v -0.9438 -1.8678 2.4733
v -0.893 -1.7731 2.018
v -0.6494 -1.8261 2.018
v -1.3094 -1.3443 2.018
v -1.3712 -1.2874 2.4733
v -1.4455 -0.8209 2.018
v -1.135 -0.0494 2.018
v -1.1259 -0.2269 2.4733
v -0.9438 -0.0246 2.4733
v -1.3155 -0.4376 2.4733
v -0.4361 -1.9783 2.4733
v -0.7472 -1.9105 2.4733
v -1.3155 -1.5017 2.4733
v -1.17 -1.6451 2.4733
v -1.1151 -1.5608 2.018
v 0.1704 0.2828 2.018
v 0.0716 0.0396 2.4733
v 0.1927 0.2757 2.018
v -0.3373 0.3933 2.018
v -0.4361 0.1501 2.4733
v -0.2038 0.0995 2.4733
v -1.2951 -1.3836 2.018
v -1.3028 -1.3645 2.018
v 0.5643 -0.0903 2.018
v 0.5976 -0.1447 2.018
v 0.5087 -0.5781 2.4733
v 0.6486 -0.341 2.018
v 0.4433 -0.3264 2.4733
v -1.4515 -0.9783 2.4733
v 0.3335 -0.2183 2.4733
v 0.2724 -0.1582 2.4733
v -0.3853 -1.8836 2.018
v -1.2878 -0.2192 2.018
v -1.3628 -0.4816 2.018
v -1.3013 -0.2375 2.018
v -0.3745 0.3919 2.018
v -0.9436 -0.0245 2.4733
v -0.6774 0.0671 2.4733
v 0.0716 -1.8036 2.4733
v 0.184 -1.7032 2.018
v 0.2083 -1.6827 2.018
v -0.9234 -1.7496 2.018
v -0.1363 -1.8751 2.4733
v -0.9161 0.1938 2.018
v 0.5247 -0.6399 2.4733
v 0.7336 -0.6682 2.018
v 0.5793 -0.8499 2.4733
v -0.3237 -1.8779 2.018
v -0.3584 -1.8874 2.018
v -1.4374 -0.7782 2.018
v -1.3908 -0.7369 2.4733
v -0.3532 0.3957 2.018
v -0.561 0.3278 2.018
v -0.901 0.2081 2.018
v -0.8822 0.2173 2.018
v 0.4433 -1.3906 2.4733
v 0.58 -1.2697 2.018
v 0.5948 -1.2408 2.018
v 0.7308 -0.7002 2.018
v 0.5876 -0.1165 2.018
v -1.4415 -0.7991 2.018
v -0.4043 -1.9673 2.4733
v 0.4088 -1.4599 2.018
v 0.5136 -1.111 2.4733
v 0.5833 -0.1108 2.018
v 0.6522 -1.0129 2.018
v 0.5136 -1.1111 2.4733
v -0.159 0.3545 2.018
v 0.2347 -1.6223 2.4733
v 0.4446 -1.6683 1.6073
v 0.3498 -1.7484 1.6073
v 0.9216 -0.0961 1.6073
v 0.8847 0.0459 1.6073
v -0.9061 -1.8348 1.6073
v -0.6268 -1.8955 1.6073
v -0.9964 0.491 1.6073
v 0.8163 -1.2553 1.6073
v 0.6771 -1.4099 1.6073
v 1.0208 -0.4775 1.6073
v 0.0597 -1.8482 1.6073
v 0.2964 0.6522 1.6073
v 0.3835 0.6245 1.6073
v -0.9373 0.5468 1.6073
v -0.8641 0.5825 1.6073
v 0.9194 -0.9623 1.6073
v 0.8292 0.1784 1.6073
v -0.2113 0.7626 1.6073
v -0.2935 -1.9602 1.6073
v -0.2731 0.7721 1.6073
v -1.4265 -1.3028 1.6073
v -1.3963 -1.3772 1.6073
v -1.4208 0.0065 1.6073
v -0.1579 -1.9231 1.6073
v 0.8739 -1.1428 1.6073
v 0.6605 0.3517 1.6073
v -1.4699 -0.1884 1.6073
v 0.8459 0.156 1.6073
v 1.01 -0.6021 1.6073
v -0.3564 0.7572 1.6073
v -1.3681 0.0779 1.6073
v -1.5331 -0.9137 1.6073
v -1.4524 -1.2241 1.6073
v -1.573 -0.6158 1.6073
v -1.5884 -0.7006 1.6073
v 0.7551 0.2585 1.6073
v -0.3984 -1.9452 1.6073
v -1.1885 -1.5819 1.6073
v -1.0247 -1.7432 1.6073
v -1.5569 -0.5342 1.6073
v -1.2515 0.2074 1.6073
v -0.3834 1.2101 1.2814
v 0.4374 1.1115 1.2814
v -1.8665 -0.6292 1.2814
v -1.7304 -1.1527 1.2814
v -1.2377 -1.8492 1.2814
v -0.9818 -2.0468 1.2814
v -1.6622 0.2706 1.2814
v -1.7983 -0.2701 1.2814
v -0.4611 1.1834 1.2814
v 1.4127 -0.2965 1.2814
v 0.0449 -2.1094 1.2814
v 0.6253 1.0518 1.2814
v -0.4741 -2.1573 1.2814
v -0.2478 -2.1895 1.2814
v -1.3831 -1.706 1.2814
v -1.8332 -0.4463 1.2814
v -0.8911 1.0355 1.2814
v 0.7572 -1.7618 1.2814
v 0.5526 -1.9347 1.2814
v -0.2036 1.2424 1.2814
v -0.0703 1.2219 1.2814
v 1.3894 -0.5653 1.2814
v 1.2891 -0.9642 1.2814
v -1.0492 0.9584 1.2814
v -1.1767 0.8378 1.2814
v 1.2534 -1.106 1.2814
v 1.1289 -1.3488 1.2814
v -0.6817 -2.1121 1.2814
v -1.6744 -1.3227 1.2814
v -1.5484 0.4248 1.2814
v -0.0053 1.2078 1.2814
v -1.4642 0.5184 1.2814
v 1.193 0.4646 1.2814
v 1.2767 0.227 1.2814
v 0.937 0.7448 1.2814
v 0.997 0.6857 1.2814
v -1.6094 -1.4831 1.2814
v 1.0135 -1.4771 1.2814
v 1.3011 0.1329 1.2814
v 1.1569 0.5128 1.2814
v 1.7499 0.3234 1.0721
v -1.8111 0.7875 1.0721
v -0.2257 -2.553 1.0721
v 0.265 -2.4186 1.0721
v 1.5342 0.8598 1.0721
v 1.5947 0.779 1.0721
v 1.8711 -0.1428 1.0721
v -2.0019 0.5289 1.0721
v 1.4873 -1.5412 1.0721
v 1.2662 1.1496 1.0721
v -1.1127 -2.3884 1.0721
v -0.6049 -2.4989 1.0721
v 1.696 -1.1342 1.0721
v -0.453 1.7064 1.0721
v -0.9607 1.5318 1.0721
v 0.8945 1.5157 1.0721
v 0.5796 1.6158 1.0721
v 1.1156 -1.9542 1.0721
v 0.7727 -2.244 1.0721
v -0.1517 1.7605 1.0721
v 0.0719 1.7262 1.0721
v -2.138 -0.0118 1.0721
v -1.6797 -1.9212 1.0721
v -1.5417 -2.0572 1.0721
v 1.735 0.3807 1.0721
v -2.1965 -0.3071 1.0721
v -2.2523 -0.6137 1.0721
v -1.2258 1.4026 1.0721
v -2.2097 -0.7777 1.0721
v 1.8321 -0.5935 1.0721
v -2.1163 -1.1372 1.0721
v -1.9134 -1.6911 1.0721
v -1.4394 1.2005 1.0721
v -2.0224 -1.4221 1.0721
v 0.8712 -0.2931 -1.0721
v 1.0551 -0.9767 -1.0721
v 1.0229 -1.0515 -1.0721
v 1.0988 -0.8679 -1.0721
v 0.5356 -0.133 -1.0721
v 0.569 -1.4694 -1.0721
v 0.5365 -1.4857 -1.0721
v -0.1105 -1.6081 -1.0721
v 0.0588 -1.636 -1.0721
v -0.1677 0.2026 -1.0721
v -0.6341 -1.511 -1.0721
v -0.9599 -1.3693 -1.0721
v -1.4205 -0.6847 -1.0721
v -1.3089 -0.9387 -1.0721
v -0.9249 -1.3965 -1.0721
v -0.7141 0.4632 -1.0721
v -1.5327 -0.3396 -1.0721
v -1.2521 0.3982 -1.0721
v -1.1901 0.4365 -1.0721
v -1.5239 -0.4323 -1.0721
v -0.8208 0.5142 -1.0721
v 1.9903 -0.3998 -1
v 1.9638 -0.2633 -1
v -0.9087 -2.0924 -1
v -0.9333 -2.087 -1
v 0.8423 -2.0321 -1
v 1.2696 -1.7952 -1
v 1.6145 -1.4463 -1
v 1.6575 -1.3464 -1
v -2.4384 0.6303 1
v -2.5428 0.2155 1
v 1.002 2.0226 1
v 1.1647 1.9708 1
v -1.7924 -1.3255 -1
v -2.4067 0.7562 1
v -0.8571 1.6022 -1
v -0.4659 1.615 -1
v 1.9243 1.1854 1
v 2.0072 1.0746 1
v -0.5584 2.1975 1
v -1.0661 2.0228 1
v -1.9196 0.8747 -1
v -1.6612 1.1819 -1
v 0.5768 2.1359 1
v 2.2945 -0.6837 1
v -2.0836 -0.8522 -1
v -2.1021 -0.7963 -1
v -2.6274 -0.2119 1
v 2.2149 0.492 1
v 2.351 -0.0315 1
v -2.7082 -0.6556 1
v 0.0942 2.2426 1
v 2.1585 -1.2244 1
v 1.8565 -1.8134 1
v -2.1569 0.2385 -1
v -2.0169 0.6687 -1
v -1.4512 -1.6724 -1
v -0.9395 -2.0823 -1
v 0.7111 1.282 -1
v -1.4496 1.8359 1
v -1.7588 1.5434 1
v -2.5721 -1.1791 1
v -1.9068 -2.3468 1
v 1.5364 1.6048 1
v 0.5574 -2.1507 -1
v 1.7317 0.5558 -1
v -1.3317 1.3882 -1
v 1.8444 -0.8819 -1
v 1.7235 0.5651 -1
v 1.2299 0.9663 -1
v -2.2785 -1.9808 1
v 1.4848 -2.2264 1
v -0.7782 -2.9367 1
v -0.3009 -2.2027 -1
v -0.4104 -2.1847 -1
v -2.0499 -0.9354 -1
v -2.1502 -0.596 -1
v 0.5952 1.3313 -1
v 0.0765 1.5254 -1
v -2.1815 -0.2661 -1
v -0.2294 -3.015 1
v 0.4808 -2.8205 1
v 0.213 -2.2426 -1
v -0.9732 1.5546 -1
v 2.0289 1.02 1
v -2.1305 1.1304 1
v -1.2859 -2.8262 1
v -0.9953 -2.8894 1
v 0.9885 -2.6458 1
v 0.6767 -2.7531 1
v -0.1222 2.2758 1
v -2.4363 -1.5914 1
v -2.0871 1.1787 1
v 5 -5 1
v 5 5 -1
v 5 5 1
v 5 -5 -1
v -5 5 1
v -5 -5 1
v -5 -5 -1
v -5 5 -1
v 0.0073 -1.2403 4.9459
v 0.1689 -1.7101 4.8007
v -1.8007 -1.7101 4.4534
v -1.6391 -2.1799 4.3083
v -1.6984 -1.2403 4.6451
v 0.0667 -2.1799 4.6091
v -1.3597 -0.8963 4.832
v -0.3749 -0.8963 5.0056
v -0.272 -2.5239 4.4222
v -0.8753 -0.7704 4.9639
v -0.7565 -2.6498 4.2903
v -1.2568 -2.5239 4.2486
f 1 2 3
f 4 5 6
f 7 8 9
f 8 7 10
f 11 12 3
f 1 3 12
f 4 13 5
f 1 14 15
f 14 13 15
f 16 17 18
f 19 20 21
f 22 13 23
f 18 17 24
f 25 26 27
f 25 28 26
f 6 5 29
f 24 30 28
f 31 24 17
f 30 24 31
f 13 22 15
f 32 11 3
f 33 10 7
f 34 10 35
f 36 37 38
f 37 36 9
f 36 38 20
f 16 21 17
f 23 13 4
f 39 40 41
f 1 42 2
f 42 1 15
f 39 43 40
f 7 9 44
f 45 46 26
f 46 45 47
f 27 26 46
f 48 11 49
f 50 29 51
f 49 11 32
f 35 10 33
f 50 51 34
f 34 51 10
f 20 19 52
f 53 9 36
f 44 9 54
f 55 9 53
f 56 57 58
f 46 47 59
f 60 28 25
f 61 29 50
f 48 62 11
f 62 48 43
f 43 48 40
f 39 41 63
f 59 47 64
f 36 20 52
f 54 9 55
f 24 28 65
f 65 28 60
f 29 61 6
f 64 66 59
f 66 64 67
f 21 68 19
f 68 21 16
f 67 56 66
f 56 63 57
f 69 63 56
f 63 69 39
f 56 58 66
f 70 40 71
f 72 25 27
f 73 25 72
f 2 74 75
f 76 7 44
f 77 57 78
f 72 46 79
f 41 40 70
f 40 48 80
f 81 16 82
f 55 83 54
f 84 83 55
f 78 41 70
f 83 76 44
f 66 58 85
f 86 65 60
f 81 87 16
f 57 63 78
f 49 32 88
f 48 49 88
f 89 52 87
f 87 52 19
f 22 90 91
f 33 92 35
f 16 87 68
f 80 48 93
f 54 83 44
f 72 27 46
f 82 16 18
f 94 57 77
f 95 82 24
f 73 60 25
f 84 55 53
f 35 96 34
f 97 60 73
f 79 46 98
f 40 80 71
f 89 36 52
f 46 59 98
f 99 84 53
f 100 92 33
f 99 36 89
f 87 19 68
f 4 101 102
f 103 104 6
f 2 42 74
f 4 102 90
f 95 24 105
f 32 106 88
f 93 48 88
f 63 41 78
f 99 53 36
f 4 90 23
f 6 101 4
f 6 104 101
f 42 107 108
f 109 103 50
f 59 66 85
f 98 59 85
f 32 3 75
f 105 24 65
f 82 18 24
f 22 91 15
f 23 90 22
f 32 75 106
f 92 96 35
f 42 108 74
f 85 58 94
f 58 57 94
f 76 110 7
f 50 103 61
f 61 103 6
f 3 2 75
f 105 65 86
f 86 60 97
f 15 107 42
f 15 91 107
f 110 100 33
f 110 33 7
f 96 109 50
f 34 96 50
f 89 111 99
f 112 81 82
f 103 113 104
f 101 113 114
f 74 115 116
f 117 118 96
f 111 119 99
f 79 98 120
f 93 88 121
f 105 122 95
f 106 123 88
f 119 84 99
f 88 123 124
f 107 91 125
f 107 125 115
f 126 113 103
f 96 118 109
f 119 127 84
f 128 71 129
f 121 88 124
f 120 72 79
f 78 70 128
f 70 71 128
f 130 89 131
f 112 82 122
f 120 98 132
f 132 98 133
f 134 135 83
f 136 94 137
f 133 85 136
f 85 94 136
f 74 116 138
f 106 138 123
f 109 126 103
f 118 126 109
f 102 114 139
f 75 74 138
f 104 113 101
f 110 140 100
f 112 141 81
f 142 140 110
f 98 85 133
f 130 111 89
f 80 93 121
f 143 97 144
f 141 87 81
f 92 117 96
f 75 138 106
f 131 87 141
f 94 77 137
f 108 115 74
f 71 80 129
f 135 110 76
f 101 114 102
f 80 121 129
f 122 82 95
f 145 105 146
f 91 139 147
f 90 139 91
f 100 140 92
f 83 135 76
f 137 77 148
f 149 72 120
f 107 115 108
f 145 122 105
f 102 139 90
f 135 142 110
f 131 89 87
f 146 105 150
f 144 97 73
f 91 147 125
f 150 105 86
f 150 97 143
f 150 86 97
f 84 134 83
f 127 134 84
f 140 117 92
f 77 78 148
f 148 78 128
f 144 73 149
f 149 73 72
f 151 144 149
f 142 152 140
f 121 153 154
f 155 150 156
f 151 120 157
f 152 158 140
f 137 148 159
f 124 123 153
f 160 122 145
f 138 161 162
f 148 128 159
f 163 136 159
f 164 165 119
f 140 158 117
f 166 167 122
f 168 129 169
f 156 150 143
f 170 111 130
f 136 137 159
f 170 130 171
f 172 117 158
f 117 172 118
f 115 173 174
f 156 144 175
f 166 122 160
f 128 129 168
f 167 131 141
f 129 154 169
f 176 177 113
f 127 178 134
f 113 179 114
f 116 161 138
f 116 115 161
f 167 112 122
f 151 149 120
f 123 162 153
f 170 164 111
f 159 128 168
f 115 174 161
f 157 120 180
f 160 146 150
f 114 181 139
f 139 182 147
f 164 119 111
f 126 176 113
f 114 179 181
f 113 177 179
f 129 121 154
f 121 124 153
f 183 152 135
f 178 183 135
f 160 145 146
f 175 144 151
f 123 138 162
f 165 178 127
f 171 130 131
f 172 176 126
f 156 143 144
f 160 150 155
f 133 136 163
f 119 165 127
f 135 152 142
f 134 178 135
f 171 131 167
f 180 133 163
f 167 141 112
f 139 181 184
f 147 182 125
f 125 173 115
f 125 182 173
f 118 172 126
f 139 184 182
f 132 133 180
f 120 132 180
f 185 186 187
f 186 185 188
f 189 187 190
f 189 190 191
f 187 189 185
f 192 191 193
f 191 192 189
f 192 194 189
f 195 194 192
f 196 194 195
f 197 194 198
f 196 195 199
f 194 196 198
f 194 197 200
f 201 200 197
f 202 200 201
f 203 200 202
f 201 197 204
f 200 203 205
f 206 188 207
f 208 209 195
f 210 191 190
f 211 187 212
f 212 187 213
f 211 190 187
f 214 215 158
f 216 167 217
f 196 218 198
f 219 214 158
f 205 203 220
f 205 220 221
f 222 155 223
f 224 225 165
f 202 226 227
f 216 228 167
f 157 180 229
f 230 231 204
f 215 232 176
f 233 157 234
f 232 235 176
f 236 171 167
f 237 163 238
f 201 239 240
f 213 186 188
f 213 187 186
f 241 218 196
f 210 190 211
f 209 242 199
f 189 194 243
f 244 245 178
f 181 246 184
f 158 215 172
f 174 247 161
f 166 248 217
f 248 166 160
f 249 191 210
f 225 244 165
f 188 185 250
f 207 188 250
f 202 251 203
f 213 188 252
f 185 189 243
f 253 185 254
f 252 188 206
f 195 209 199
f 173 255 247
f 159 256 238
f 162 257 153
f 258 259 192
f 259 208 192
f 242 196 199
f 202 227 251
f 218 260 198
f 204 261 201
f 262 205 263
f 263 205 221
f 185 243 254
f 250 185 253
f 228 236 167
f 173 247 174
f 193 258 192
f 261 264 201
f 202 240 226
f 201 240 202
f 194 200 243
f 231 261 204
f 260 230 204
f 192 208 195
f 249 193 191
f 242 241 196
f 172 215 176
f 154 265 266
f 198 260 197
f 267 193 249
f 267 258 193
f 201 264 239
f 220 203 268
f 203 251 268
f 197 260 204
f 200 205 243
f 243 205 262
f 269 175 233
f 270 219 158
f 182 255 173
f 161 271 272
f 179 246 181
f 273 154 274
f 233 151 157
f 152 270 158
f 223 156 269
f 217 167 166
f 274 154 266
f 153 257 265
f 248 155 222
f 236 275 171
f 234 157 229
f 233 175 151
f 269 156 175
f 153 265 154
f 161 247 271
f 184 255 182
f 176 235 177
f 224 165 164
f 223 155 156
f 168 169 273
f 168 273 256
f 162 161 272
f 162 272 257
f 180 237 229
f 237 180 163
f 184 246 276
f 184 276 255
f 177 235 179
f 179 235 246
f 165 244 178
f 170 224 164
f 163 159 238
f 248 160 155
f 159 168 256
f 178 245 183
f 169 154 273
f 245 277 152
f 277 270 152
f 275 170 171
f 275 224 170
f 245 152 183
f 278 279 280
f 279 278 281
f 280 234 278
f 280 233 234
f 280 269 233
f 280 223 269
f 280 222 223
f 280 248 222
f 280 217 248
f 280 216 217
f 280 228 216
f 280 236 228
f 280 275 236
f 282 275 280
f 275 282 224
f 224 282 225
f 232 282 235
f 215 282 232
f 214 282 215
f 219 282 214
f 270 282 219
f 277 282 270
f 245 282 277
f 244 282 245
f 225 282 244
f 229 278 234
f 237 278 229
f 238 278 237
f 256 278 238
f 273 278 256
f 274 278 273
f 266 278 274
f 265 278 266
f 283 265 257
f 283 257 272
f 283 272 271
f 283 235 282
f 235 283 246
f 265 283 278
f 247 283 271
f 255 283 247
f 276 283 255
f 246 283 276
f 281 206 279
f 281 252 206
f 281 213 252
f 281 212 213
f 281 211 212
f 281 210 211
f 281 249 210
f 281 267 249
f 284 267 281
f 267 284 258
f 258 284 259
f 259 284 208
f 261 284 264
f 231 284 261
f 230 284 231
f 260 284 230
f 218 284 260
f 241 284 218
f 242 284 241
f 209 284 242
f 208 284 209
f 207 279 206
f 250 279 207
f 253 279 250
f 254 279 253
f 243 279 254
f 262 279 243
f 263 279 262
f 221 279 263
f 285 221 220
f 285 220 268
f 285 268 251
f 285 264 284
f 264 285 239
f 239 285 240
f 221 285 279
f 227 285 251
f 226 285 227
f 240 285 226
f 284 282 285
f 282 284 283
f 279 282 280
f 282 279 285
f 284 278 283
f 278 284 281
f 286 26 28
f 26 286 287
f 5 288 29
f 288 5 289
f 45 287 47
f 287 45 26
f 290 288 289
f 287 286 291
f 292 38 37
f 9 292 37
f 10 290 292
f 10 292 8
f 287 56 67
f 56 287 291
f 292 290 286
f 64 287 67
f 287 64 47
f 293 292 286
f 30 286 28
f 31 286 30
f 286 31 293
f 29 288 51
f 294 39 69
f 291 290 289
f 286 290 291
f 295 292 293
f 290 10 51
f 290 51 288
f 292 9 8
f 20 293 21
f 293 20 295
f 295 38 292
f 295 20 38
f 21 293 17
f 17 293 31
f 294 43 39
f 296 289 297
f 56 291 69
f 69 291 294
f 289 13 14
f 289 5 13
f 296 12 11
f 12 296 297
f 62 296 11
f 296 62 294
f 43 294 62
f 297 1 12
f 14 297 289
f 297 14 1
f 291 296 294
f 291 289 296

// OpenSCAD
    ////////////////////////////////////////////////////////
    /*
    unionRound() 1.0 Module by Torleif Ceder - TLC123 late summer 2021
     Pretty fast Union with radius, But limited to a subset of cases
    Usage 
     unionRound( radius , detail , epsilon )
        {
         YourObject();
         YourObject(); 
        } 
    limitations: 
     0. Only really fast when boolean operands are convex, 
            Minkowski is fast in that case. 
     1. Boolean operands may be concave but can only touch 
            in a single convex area
     2. Radius is of elliptic type and is only approximate r
            were operand intersect at perpendicular angle. 
    */
    //////////////////////////////////////////////////////// 
    // Demo code
     unionRound(1.5, 5) {
     cube([10,10,2],true);
     rotate([20,-10,0])cylinder(5,1,1,$fn=12);
    }
    // end of demo code
    //
    module unionRound(r, detail = 5) {
        epsilon = 1e-6;
        children(0);
        children(1);
        step = 90 / detail;
      for (i = [0:  detail-1]) {
            {
                x = r - sin(i * step ) * r;
                y = r - cos(i * step ) * r;
                xi = r - sin((i * step + step)  ) * r;
                yi = r - cos((i * step + step)  ) * r;
                color(rands(0, 1, 3, i))
                hull() {
                    intersection() {
                        // shell(epsilon) 
                        clad(x) children(0);
                        // shell(epsilon) 
                        clad(y) children(1);
                    }
                    intersection() {
                        // shell(epsilon) 
                        clad(xi) children(0);
                        // shell(epsilon) 
                        clad(yi) children(1);
                    }
                }
            }
        }
    }
    // unionRound helper expand by r
    module clad(r) {
        minkowski() {
            children();
            //        icosphere(r,2);
             isosphere(r,70); 
        }
    }
    // unionRound helper
    module shell(r) {
        difference() {
            clad(r) children();
            children();
        }
    }
    /*    
    // The following is a sphere with some equidistant properties.
    // Not strictly necessary

    A New Computationally Efficient Method for Spacing n Points on 
    a Sphere - Jonathan Kogan  */
    function sphericalcoordinate(x,y)=  [cos(x  )*cos(y  ), sin(x  )*cos(y  ), sin(y  )];
    function NX(n,x)= 
    let(toDeg=57.2958,PI=acos(-1)/toDeg,
    start=(-1.+1./(n-1.)),increment=(2.-2./(n-1.))/(n-1.) )
    [ for (j= [0:n-1])let (s=start+j*increment )
    sphericalcoordinate(   s*x*toDeg,  PI/2.* sign(s)*(1.-sqrt(1.-abs(s)))*toDeg)];
    function generatepoints(n)= NX(n,0.1+1.2*n);
    module isosphere(r,detail){
    a= generatepoints(detail);
    scale(r)hull()polyhedron(a,[[for(i=[0:len(a)-1])i]]);
    }
